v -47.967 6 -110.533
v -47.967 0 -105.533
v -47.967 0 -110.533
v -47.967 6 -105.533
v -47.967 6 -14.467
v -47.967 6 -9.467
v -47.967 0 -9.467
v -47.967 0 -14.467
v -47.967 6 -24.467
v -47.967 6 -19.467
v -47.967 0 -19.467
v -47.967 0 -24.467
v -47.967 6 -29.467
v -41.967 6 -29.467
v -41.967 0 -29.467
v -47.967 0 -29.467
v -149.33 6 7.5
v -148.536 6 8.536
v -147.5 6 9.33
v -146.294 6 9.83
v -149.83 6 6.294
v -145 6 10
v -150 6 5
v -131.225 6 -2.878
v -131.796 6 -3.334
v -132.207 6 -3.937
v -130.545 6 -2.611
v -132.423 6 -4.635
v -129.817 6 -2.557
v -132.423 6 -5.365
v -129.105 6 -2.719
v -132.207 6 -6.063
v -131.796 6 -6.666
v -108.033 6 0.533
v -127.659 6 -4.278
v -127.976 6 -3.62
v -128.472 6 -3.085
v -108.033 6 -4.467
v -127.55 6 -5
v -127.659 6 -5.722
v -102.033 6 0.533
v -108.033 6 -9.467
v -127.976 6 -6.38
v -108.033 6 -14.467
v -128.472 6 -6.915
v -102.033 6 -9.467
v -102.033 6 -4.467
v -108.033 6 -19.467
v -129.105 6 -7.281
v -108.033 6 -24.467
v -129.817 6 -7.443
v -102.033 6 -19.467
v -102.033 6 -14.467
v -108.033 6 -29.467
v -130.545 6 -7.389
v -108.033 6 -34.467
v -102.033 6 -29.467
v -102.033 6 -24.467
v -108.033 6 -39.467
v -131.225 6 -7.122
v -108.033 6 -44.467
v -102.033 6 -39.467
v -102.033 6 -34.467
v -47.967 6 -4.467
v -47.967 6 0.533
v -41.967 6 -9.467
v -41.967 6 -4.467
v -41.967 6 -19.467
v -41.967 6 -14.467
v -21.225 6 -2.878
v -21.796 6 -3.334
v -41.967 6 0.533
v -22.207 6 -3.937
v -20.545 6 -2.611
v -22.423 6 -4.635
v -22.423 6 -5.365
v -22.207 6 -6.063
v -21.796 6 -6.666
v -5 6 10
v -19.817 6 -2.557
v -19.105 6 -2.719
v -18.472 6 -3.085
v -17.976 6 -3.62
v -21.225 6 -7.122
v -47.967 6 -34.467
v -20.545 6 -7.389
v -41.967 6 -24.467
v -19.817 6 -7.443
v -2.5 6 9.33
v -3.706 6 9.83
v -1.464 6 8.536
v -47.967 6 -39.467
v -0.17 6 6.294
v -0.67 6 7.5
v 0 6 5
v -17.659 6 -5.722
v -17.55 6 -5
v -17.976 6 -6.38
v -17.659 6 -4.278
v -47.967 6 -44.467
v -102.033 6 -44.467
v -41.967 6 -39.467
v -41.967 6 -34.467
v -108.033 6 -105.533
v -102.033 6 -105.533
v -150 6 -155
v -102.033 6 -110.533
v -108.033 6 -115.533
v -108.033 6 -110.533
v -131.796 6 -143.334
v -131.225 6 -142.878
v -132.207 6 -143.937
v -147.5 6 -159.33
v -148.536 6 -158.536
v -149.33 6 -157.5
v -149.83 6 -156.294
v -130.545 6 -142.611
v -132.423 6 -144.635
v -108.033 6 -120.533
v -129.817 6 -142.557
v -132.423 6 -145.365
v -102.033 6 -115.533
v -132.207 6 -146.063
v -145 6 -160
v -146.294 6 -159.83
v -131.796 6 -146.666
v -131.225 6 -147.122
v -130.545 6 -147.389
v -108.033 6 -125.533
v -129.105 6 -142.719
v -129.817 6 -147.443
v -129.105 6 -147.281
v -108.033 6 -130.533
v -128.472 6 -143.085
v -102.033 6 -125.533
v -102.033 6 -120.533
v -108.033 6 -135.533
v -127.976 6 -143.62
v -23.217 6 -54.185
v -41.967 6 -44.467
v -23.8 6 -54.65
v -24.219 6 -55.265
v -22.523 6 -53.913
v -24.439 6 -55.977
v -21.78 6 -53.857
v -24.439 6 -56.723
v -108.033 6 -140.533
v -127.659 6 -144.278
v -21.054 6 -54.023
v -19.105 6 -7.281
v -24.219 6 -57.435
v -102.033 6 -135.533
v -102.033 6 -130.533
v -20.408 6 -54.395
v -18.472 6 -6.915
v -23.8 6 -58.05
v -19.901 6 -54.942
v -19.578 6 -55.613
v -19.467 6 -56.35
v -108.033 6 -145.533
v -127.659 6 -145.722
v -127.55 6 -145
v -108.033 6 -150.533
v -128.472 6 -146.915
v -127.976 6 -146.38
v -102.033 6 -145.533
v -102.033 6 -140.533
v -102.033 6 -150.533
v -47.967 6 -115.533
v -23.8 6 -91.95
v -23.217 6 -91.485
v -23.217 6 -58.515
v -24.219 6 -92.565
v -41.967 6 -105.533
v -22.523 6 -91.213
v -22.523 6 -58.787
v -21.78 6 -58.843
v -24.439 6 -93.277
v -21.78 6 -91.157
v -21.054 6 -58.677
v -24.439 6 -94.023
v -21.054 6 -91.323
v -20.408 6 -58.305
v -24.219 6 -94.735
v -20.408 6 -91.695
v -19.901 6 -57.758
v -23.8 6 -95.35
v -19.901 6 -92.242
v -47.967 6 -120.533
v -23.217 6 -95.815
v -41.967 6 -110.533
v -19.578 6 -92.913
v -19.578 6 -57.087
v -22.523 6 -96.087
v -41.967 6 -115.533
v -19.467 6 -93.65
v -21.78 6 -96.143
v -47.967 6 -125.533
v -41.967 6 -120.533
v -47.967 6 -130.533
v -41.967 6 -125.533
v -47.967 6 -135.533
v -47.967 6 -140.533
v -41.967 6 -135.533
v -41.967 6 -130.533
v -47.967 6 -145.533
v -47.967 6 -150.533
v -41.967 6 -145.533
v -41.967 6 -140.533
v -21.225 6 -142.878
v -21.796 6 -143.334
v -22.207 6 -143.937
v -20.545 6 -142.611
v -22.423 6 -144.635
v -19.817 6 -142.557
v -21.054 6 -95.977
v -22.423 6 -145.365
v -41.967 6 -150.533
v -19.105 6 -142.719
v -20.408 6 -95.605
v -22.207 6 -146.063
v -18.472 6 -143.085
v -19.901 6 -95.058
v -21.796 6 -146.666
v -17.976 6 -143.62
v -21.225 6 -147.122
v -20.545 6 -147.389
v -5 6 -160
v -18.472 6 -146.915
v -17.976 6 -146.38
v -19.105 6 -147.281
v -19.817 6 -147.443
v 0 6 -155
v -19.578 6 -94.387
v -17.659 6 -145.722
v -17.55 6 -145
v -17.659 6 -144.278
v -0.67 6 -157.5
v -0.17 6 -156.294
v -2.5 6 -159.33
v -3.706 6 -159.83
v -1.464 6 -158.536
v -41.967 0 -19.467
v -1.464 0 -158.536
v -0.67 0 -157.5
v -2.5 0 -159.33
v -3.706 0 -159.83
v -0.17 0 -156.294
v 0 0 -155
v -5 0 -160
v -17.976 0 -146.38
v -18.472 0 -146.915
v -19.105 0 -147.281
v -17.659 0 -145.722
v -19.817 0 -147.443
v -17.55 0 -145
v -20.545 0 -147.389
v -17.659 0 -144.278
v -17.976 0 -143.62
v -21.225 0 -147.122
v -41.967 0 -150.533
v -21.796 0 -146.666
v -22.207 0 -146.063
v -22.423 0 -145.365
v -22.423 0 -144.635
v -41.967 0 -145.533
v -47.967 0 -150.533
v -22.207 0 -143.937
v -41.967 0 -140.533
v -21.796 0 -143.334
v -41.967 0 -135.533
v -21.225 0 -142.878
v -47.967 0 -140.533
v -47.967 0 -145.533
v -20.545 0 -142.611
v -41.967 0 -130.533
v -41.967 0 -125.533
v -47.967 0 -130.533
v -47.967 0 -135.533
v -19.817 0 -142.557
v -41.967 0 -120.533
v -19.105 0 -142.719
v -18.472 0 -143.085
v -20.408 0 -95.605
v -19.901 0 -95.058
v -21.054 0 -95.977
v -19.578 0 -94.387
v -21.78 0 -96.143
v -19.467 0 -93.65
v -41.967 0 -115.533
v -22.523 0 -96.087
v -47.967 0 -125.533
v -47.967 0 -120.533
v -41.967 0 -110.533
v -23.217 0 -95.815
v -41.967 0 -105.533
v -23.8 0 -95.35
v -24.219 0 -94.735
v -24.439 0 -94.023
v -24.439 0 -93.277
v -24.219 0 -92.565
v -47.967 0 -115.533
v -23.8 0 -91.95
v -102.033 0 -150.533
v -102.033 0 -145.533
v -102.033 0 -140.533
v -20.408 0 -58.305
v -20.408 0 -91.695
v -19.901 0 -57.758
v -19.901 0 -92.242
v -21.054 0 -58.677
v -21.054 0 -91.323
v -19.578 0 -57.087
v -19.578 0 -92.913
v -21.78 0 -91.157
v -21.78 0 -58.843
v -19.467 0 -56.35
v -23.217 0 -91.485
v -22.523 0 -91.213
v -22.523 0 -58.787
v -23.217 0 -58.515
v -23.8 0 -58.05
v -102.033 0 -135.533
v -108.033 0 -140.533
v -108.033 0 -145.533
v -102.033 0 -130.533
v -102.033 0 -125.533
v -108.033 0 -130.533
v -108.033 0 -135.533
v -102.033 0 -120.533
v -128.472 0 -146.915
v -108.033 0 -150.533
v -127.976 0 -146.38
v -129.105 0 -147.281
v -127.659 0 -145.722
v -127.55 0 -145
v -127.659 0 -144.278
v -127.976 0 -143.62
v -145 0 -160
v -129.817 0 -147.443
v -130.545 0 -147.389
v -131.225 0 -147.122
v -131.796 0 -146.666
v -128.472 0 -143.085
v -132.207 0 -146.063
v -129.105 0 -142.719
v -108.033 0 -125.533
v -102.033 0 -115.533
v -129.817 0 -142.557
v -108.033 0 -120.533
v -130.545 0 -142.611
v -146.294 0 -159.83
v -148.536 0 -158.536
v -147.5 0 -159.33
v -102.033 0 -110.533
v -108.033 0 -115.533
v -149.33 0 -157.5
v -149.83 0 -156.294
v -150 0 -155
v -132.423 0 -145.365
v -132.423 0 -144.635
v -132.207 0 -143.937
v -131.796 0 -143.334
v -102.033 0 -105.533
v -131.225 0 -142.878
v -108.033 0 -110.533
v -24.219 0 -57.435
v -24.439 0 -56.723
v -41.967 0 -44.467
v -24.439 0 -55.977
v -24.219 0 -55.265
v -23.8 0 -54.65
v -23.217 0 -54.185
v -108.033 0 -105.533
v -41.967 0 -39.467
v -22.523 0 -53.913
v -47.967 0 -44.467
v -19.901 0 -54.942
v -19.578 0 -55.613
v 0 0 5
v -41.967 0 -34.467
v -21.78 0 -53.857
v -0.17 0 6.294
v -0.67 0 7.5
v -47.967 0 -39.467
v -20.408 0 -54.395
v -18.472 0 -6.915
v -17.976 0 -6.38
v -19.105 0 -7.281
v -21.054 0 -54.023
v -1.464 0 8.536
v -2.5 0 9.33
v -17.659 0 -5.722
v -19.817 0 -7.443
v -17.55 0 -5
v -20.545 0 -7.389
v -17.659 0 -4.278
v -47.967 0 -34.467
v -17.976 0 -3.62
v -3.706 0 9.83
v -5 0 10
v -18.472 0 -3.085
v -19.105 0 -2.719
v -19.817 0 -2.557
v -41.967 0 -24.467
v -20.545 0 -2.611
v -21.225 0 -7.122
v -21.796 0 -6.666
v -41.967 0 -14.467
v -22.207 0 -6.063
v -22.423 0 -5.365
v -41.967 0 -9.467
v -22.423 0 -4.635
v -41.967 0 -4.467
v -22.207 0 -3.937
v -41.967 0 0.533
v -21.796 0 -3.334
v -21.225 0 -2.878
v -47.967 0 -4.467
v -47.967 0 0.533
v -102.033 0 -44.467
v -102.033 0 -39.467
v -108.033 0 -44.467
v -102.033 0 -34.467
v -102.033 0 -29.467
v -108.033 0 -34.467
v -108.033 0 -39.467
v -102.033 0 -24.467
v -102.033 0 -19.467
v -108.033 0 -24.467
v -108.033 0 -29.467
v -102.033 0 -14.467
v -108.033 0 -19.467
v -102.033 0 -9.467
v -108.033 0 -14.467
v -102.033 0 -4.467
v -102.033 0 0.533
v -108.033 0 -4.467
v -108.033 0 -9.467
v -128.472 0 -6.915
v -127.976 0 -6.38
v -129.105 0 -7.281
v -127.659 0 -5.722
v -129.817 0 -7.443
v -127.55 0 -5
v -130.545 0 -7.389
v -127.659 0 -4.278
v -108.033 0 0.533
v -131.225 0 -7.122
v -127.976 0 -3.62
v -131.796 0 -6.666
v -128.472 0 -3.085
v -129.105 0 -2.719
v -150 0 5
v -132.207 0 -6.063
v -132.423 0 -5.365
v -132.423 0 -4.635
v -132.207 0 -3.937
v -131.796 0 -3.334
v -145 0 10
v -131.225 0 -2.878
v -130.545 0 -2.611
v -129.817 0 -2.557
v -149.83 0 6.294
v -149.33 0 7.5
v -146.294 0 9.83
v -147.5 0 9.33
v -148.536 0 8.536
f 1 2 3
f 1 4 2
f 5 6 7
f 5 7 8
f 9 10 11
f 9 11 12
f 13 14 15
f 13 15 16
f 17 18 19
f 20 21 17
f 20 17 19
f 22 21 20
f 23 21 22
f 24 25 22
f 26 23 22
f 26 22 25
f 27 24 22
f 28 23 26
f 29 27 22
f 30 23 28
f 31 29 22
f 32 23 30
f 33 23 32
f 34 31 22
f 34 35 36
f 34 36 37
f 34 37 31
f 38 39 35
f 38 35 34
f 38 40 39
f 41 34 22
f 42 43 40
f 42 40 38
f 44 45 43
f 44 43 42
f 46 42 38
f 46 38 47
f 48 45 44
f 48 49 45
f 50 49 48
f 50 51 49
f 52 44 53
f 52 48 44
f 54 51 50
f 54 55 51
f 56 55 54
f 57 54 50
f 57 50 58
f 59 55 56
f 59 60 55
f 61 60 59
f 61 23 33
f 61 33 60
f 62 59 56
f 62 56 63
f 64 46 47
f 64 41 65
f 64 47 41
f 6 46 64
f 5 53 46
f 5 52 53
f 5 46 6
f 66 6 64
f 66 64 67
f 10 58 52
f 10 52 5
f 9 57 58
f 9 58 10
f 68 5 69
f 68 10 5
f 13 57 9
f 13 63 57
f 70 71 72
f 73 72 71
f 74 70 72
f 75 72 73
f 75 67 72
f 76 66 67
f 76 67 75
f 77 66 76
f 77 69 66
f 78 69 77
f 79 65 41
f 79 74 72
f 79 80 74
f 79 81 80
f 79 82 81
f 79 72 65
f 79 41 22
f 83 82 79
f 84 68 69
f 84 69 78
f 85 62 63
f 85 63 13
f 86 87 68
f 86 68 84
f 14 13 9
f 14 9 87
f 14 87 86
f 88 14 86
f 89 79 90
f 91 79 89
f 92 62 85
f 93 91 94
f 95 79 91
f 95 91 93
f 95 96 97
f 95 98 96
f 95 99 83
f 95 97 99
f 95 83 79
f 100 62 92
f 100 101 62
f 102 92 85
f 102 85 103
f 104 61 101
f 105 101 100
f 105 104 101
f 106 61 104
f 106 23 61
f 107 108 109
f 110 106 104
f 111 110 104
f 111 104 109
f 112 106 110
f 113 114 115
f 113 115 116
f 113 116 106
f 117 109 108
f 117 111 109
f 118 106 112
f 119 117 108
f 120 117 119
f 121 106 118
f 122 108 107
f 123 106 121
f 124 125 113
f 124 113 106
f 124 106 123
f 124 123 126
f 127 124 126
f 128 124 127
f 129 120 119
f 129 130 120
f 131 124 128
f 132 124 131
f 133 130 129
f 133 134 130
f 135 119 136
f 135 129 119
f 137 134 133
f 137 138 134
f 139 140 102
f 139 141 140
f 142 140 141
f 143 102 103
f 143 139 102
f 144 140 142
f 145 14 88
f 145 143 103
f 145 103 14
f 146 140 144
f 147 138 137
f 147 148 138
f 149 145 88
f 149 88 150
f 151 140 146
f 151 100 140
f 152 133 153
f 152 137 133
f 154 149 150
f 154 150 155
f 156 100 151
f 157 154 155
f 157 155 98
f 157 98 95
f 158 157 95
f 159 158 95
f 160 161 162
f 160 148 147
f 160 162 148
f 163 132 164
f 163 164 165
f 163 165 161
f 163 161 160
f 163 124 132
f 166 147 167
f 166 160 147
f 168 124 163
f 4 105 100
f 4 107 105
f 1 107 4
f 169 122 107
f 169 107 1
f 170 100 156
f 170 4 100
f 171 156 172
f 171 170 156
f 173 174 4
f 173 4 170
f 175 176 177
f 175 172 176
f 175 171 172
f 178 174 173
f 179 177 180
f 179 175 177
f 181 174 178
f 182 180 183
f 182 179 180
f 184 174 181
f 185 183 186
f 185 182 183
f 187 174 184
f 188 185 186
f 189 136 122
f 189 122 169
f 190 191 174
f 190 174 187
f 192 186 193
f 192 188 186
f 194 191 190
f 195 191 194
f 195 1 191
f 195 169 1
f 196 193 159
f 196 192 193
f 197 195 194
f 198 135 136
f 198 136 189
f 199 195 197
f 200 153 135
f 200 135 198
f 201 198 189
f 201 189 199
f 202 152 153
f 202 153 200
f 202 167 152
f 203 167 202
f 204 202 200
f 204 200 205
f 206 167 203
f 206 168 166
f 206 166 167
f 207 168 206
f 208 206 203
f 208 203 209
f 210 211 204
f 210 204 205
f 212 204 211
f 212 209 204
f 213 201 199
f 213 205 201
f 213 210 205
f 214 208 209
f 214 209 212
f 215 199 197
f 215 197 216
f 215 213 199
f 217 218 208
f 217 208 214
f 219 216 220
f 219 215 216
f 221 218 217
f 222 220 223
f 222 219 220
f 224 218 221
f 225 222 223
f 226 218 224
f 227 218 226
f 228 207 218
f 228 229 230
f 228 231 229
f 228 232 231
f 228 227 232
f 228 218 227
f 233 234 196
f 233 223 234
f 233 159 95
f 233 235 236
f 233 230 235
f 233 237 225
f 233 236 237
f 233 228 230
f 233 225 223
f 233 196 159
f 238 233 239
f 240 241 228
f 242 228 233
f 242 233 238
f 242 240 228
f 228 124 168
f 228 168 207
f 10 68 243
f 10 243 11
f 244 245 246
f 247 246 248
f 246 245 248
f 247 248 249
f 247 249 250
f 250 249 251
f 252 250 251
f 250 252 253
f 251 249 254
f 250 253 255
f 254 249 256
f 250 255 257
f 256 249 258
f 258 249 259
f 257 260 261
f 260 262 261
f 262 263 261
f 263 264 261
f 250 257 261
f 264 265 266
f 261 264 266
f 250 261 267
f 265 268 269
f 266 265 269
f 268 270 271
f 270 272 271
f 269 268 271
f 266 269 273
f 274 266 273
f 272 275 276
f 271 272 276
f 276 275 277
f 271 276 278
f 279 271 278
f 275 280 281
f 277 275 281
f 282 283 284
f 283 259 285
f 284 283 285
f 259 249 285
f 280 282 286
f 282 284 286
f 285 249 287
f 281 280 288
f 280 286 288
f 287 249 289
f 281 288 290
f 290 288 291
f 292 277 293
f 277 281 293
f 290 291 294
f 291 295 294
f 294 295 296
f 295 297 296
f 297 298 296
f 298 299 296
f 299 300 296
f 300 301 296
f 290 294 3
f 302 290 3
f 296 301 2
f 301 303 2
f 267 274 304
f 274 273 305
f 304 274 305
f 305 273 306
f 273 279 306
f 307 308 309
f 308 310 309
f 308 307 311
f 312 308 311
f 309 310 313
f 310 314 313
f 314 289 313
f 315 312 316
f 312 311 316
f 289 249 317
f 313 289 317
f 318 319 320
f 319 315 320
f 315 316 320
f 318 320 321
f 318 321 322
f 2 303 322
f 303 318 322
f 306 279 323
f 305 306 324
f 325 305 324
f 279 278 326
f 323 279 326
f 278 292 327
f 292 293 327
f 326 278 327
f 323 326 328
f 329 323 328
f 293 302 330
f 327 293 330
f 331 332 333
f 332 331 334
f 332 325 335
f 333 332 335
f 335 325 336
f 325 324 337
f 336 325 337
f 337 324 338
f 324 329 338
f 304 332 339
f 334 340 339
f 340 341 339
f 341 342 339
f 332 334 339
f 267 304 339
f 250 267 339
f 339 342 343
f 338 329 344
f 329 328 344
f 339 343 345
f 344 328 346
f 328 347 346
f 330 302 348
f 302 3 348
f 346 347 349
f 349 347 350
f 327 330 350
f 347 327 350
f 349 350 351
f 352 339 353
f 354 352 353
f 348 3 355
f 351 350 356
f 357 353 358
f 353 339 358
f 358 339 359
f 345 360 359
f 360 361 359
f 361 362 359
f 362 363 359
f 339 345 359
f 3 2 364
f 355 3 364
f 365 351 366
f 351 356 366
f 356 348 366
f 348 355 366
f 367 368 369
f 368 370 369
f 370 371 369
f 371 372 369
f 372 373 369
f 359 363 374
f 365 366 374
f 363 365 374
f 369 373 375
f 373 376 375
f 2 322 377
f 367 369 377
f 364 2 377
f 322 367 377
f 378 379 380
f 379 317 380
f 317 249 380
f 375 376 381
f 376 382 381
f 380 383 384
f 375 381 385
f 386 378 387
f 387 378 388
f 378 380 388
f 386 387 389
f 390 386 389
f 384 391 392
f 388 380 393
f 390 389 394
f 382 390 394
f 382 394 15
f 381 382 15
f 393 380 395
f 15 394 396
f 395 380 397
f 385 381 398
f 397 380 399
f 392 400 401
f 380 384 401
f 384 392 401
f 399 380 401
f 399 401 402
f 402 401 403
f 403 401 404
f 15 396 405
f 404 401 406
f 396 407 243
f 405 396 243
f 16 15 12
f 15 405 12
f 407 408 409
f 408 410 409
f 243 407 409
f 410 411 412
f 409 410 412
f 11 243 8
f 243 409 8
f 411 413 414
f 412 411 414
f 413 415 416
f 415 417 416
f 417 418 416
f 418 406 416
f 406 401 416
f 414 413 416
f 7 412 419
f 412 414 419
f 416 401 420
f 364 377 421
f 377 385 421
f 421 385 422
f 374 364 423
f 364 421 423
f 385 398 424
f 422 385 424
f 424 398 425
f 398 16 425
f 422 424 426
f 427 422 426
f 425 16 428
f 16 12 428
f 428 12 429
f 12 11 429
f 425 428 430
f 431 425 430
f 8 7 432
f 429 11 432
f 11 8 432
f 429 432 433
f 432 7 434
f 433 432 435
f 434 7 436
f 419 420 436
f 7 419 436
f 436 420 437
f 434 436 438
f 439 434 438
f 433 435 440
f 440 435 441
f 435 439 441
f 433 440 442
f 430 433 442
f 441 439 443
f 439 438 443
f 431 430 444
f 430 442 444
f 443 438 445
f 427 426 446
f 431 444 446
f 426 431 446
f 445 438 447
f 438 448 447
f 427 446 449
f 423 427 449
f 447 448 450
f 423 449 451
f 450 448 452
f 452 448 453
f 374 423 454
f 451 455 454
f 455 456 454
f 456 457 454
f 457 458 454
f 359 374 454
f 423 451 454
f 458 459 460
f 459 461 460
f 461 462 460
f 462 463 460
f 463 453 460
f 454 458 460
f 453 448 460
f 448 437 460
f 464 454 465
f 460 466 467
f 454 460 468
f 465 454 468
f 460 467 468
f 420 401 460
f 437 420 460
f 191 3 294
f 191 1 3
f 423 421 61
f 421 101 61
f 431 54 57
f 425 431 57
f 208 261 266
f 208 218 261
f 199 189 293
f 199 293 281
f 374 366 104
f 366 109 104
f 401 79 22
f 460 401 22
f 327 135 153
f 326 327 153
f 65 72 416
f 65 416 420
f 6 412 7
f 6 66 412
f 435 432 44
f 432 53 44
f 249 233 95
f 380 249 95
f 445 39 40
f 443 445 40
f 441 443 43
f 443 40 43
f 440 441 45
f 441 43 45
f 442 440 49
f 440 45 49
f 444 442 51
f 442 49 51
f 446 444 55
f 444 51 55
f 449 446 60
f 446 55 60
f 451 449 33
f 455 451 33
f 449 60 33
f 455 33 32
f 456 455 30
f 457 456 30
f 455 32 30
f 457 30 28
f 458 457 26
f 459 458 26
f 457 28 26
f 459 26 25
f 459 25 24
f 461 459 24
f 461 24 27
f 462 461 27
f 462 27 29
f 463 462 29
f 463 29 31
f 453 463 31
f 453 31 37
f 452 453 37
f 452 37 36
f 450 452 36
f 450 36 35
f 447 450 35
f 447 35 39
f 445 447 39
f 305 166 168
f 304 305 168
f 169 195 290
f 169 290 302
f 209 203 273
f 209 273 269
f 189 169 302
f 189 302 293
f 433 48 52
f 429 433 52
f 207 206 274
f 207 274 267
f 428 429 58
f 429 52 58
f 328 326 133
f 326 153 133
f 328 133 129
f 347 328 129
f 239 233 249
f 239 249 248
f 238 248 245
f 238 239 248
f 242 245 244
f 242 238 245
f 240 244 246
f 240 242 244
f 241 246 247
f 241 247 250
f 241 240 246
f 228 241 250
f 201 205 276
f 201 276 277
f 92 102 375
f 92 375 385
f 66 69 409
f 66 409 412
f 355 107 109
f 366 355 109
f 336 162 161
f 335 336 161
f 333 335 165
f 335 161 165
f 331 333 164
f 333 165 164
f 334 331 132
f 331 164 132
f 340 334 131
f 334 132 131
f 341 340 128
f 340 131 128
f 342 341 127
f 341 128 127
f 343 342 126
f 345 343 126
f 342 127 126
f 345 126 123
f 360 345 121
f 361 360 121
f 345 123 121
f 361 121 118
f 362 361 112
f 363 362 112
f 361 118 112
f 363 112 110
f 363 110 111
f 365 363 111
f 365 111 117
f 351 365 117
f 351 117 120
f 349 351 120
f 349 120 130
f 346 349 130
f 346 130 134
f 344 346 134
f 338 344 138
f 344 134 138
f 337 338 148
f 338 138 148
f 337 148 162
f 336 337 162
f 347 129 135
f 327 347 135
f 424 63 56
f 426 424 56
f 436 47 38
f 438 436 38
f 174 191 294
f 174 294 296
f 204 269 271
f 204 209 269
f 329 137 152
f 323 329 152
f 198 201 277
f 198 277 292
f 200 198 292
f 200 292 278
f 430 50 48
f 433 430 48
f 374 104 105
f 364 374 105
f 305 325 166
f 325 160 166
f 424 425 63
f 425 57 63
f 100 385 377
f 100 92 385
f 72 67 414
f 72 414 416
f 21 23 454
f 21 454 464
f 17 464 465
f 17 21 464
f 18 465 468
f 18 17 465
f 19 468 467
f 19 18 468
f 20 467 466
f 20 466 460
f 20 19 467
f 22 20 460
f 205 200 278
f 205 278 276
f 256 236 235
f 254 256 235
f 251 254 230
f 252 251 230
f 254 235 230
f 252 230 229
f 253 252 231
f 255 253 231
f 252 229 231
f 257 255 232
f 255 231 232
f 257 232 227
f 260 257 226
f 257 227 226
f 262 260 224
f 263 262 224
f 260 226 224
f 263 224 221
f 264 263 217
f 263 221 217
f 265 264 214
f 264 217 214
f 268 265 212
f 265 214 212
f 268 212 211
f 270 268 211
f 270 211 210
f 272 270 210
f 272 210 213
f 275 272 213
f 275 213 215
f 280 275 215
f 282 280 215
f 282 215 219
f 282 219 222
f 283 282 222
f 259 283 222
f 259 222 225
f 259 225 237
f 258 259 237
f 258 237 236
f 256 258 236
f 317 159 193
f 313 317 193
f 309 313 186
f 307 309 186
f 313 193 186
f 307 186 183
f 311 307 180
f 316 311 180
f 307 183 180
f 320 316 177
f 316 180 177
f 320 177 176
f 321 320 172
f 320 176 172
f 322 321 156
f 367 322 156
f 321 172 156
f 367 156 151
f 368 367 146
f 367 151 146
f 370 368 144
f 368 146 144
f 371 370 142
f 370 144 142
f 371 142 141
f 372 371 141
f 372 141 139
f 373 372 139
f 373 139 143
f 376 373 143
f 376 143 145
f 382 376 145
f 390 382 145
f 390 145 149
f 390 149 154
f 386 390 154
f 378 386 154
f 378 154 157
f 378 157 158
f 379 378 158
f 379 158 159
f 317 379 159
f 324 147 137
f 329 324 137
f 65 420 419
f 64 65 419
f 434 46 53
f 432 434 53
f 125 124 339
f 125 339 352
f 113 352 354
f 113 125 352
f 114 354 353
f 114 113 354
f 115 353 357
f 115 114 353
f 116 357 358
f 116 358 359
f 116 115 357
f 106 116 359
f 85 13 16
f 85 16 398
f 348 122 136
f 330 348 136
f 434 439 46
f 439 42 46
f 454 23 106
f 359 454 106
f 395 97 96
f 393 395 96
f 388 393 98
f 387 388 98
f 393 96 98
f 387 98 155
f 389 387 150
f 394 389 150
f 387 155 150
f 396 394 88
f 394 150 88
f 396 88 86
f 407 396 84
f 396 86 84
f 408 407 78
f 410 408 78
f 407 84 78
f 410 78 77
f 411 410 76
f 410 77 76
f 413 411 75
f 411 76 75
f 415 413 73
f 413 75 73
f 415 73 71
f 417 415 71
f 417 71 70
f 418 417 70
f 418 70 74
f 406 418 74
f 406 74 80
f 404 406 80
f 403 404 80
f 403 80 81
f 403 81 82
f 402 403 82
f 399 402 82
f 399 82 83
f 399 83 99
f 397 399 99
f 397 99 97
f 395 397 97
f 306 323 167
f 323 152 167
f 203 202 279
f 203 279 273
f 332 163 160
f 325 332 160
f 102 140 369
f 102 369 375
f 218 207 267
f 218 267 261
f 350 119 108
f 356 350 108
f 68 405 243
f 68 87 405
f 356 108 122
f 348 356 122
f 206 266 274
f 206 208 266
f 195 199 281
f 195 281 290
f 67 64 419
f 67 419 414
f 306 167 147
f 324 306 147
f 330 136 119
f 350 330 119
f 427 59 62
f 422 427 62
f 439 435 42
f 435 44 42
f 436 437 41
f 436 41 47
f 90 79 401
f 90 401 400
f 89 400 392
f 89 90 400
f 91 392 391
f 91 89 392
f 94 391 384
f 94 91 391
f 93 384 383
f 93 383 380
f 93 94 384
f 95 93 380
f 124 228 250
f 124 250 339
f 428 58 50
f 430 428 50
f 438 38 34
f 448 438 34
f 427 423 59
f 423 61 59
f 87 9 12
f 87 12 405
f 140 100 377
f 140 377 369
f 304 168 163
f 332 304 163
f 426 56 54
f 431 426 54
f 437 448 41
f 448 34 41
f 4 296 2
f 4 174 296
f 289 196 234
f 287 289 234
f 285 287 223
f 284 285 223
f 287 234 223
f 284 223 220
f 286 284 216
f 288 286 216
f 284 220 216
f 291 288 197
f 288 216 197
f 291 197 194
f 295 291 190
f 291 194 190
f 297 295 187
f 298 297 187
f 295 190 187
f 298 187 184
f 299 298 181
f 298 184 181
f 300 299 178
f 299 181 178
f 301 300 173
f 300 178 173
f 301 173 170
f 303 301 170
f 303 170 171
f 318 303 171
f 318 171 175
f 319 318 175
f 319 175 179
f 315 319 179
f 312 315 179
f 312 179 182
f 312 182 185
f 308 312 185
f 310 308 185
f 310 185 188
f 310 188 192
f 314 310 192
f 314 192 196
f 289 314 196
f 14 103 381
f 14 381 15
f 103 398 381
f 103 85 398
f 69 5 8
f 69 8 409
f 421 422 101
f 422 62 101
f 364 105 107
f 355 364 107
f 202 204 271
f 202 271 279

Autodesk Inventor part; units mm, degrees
ref_plane "YZ Plane" through (0, 0, 0) normal (1, 0, 0) x (0, 1, 0)
ref_plane "XZ Plane" through (0, 0, 0) normal (0, 1, 0) x (-1, 0, 0)
ref_plane "XY Plane" through (0, 0, 0) normal (0, 0, 1) x (1, 0, 0)
sketch "Sketch1" plane through (0, 0, 0) normal (0, 1, 0) x (-1, 0, 0)
  line L0 (5, 0) -> (145, 0)
  line L1 (150, -5) -> (150, -145)
  line L2 (145, -150) -> (5, -150)
  line L3 (0, -145) -> (0, -5)
  arc A0 (150, -5) -> (145, 0) centre (145, -5) ccw
  arc A1 (145, -150) -> (150, -145) centre (145, -145) ccw
  arc A2 (5, 0) -> (0, -5) centre (5, -5) ccw
  arc A3 (0, -145) -> (5, -150) centre (5, -145) ccw
  circle A4 centre (128.033, -128.033) radius 5
  circle A5 centre (128.033, -21.967) radius 5
  circle A6 centre (21.967, -21.967) radius 5
  circle A7 centre (21.967, -128.033) radius 5
  point P0 (0, 0)
  point P1 (150, -150)
  point P2 (150, 0)
  point P3 (0, -150)
  dimension "d0" = 150
  dimension "d1" = 150
  dimension "d2" = 5
  dimension "d9" = 10
  dimension "d10" = 10
  dimension "d11" = 10
  dimension "d12" = 10
extrude "Extrusion1" add sketch "Sketch1" along normal blind 6
sketch "Sketch2" plane through (0, 6, 0) normal (0, 1, 0) x (1, 0, 0)
  line L0 (0, 5) -> (0, 145) projected
  circle A0 centre (-21.967, 21.967) radius 5 projected
  circle A1 centre (-21.967, 77.828) radius 11
  circle A2 centre (-37.467, 62.328) radius 1.6
  circle A3 centre (-37.467, 93.328) radius 1.6
  circle A4 centre (-6.467, 62.328) radius 1.6
  circle A5 centre (-6.467, 93.328) radius 1.6
  point P0 (0, 0)
  dimension "d15" = 22
  dimension "d21" = 3.2
  dimension "d22" = 3.2
  dimension "d23" = 3.2
  dimension "d24" = 3.2
extrude "Extrusion2" cut sketch "Sketch2" against normal blind 6 contours A1 | A2 | A3 | A4 | A5
sketch "Sketch3" plane through (0, 6, 0) normal (0, 1, 0) x (1, 0, 0)
  circle A0 centre (-128.033, 128.033) radius 5 projected
  arc A1 (-145, 150) -> (-150, 145) centre (-145, 145) ccw projected
  line L0 (-150, 145) -> (0, 145)
  line L1 (0, 145) -> (0, 155)
  line L2 (-5, 160) -> (-145, 160)
  line L3 (-150, 155) -> (-150, 145)
  arc A2 (-150, 5) -> (-145, 0) centre (-145, 5) ccw projected
  line L4 (-150, 5) -> (0, 5)
  line L5 (0, 5) -> (0, -5)
  line L6 (-5, -10) -> (-145, -10)
  line L7 (-150, -5) -> (-150, 5)
  arc A3 (-145, 160) -> (-150, 155) centre (-145, 155) ccw
  arc A4 (0, 155) -> (-5, 160) centre (-5, 155) ccw
  arc A5 (-150, -5) -> (-145, -10) centre (-145, -5) ccw
  arc A6 (-5, -10) -> (0, -5) centre (-5, -5) ccw
  point P0 (0, 0)
  point P1 (0, 160)
  point P2 (-150, 160)
  point P3 (0, -10)
  point P4 (-150, -10)
  dimension "d29" = 150
  dimension "d30" = 15
  dimension "d31" = 150
  dimension "d32" = 15
  dimension "d33" = 5
extrude "Extrusion3" add sketch "Sketch3" against normal blind 6 contours L3 A3 L2 A4 L1 L0 | L4 L5 A6 L6 A5 L7
sketch "Sketch4" plane through (0, 6, 0) normal (0, 1, 0) x (1, 0, 0)
  circle A0 centre (-128.033, 128.033) radius 5 projected
  line L0 (-108.033, 105.533) -> (-102.033, 105.533)
  line L1 (-102.033, 105.533) -> (-102.033, 110.533)
  line L2 (-102.033, 110.533) -> (-108.033, 110.533)
  line L3 (-108.033, 110.533) -> (-108.033, 105.533)
  circle A1 centre (-21.967, 128.033) radius 5 projected
  line L4 (-41.967, 105.533) -> (-47.967, 105.533)
  line L5 (-47.967, 105.533) -> (-47.967, 110.533)
  line L6 (-47.967, 110.533) -> (-41.967, 110.533)
  line L7 (-41.967, 110.533) -> (-41.967, 105.533)
  circle A2 centre (-128.033, 21.967) radius 5 projected
  line L8 (-108.033, -0.533) -> (-102.033, -0.533)
  line L9 (-102.033, -0.533) -> (-102.033, 4.467)
  line L10 (-102.033, 4.467) -> (-108.033, 4.467)
  line L11 (-108.033, 4.467) -> (-108.033, -0.533)
  circle A3 centre (-21.967, 21.967) radius 5 projected
  line L12 (-41.967, -0.533) -> (-47.967, -0.533)
  line L13 (-47.967, -0.533) -> (-47.967, 4.467)
  line L14 (-47.967, 4.467) -> (-41.967, 4.467)
  line L15 (-41.967, 4.467) -> (-41.967, -0.533)
  point P0 (0, 0)
  dimension "d39" = 6
  dimension "d40" = 5
  dimension "d43" = 6
  dimension "d44" = 5
  dimension "d47" = 6
  dimension "d48" = 5
  dimension "d51" = 6
  dimension "d52" = 5
extrude "Extrusion4" cut sketch "Sketch4" against normal blind 6 contours L3 L2 L1 L0 | L4 L5 L6 L7 | L11 L10 L9 L8 | L12 L13 L14 L15
pattern_linear "Rectangular Pattern1" count 5 spacing 10 along (0, 0, -1) of "Extrusion4"
sketch "Sketch5" plane through (0, 6, 0) normal (0, 1, 0) x (1, 0, 0)
  circle A0 centre (-128.033, 21.967) radius 5 projected
  circle A1 centre (-128.033, 21.967) radius 5
  circle A2 centre (-128.033, 128.033) radius 5 projected
  circle A3 centre (-128.033, 128.033) radius 5
  circle A4 centre (-21.967, 128.033) radius 5 projected
  circle A5 centre (-21.967, 128.033) radius 5
  circle A6 centre (-21.967, 21.967) radius 5 projected
  circle A7 centre (-21.967, 21.967) radius 5
  point P0 (0, 0)
  dimension "d58" = 10
  dimension "d59" = 10
  dimension "d60" = 10
  dimension "d61" = 10
extrude "Extrusion5" add sketch "Sketch5" against normal blind 6
sketch "Sketch6" plane through (0, 6, 0) normal (0, 1, 0) x (1, 0, 0)
  point P0 (0, 0)
sketch "Sketch7" plane through (0, 6, 0) normal (0, 1, 0) x (1, 0, 0)
  line L0 (0, 155) -> (0, -5) projected
  line L1 (-44.6941, 101.1625) -> (0, 101.1625)
  line L2 (0, 101.1625) -> (0, 52.2821)
  line L3 (0, 52.2821) -> (-44.6941, 52.2821)
  line L4 (-44.6941, 52.2821) -> (-44.6941, 101.1625)
  point P0 (0, 0)
extrude "Extrusion6" add sketch "Sketch7" against normal blind 6
sketch "Sketch8" plane through (0, 6, 0) normal (0, 1, 0) x (1, 0, 0)
  line L0 (0, 155) -> (0, -5) projected
  circle A0 centre (-21.967, 93.65) radius 2.5
  circle A1 centre (-21.967, 56.35) radius 2.5
  point P0 (0, 0)
  dimension "d69" = 5
  dimension "d70" = 5
extrude "Extrusion7" cut sketch "Sketch8" against normal blind 6
sketch "Sketch9" plane through (0, 6, 0) normal (0, 1, 0) x (1, 0, 0)
  line L0 (-150, -5) -> (-150, 155) projected
  line L1 (-5, -10) -> (-145, -10) projected
  line L2 (-135, -10) -> (-120, -10) construction
  line L3 (0, 155) -> (0, -5) projected
  line L4 (0, 5) -> (15, 5) construction
  line L5 (0, 145) -> (15, 145) construction
  circle A0 centre (-130, 5) radius 2.45
  circle A1 centre (-130, 145) radius 2.45
  circle A2 centre (-20, 5) radius 2.45
  circle A3 centre (-20, 145) radius 2.45
  line L6 (-75, 75) -> (-63, 75) construction
  circle A4 centre (-83.4853, 66.5147) radius 2.75
  circle A5 centre (-83.4853, 83.4853) radius 2.75
  circle A6 centre (-66.5147, 83.4853) radius 2.75
  circle A7 centre (-66.5147, 66.5147) radius 2.75
  line L7 (-20, 5) -> (0, 5)
  line L8 (-130, 5) -> (-150, 5)
  line L9 (-130, 145) -> (-150, 145)
  line L10 (-20, 145) -> (0, 145)
  point P0 (0, 0)
  dimension "d82" = 4.9
  dimension "d83" = 4.9
  dimension "d84" = 4.9
  dimension "d85" = 4.9
  dimension "d92" = 5.5
  dimension "d93" = 5.5
  dimension "d94" = 5.5
  dimension "d95" = 5.5
  dimension "d98" = 20
  dimension "d99" = 20
  dimension "d100" = 20
  dimension "d101" = 20
extrude "Extrusion8" cut sketch "Sketch9" against normal blind 6
sketch "Sketch10" plane through (0, 6, 0) normal (0, 1, 0) x (1, 0, 0)
  line L0 (-94.8233, 59.338) -> (-53.739, 59.338)
  line L1 (-53.739, 59.338) -> (-53.739, 90.7909)
  line L2 (-53.739, 90.7909) -> (-94.8233, 90.7909)
  line L3 (-94.8233, 90.7909) -> (-94.8233, 59.338)
  point P0 (0, 0)
extrude "Extrusion9" add sketch "Sketch10" against normal blind 6
properties part number "e_bot 1"
